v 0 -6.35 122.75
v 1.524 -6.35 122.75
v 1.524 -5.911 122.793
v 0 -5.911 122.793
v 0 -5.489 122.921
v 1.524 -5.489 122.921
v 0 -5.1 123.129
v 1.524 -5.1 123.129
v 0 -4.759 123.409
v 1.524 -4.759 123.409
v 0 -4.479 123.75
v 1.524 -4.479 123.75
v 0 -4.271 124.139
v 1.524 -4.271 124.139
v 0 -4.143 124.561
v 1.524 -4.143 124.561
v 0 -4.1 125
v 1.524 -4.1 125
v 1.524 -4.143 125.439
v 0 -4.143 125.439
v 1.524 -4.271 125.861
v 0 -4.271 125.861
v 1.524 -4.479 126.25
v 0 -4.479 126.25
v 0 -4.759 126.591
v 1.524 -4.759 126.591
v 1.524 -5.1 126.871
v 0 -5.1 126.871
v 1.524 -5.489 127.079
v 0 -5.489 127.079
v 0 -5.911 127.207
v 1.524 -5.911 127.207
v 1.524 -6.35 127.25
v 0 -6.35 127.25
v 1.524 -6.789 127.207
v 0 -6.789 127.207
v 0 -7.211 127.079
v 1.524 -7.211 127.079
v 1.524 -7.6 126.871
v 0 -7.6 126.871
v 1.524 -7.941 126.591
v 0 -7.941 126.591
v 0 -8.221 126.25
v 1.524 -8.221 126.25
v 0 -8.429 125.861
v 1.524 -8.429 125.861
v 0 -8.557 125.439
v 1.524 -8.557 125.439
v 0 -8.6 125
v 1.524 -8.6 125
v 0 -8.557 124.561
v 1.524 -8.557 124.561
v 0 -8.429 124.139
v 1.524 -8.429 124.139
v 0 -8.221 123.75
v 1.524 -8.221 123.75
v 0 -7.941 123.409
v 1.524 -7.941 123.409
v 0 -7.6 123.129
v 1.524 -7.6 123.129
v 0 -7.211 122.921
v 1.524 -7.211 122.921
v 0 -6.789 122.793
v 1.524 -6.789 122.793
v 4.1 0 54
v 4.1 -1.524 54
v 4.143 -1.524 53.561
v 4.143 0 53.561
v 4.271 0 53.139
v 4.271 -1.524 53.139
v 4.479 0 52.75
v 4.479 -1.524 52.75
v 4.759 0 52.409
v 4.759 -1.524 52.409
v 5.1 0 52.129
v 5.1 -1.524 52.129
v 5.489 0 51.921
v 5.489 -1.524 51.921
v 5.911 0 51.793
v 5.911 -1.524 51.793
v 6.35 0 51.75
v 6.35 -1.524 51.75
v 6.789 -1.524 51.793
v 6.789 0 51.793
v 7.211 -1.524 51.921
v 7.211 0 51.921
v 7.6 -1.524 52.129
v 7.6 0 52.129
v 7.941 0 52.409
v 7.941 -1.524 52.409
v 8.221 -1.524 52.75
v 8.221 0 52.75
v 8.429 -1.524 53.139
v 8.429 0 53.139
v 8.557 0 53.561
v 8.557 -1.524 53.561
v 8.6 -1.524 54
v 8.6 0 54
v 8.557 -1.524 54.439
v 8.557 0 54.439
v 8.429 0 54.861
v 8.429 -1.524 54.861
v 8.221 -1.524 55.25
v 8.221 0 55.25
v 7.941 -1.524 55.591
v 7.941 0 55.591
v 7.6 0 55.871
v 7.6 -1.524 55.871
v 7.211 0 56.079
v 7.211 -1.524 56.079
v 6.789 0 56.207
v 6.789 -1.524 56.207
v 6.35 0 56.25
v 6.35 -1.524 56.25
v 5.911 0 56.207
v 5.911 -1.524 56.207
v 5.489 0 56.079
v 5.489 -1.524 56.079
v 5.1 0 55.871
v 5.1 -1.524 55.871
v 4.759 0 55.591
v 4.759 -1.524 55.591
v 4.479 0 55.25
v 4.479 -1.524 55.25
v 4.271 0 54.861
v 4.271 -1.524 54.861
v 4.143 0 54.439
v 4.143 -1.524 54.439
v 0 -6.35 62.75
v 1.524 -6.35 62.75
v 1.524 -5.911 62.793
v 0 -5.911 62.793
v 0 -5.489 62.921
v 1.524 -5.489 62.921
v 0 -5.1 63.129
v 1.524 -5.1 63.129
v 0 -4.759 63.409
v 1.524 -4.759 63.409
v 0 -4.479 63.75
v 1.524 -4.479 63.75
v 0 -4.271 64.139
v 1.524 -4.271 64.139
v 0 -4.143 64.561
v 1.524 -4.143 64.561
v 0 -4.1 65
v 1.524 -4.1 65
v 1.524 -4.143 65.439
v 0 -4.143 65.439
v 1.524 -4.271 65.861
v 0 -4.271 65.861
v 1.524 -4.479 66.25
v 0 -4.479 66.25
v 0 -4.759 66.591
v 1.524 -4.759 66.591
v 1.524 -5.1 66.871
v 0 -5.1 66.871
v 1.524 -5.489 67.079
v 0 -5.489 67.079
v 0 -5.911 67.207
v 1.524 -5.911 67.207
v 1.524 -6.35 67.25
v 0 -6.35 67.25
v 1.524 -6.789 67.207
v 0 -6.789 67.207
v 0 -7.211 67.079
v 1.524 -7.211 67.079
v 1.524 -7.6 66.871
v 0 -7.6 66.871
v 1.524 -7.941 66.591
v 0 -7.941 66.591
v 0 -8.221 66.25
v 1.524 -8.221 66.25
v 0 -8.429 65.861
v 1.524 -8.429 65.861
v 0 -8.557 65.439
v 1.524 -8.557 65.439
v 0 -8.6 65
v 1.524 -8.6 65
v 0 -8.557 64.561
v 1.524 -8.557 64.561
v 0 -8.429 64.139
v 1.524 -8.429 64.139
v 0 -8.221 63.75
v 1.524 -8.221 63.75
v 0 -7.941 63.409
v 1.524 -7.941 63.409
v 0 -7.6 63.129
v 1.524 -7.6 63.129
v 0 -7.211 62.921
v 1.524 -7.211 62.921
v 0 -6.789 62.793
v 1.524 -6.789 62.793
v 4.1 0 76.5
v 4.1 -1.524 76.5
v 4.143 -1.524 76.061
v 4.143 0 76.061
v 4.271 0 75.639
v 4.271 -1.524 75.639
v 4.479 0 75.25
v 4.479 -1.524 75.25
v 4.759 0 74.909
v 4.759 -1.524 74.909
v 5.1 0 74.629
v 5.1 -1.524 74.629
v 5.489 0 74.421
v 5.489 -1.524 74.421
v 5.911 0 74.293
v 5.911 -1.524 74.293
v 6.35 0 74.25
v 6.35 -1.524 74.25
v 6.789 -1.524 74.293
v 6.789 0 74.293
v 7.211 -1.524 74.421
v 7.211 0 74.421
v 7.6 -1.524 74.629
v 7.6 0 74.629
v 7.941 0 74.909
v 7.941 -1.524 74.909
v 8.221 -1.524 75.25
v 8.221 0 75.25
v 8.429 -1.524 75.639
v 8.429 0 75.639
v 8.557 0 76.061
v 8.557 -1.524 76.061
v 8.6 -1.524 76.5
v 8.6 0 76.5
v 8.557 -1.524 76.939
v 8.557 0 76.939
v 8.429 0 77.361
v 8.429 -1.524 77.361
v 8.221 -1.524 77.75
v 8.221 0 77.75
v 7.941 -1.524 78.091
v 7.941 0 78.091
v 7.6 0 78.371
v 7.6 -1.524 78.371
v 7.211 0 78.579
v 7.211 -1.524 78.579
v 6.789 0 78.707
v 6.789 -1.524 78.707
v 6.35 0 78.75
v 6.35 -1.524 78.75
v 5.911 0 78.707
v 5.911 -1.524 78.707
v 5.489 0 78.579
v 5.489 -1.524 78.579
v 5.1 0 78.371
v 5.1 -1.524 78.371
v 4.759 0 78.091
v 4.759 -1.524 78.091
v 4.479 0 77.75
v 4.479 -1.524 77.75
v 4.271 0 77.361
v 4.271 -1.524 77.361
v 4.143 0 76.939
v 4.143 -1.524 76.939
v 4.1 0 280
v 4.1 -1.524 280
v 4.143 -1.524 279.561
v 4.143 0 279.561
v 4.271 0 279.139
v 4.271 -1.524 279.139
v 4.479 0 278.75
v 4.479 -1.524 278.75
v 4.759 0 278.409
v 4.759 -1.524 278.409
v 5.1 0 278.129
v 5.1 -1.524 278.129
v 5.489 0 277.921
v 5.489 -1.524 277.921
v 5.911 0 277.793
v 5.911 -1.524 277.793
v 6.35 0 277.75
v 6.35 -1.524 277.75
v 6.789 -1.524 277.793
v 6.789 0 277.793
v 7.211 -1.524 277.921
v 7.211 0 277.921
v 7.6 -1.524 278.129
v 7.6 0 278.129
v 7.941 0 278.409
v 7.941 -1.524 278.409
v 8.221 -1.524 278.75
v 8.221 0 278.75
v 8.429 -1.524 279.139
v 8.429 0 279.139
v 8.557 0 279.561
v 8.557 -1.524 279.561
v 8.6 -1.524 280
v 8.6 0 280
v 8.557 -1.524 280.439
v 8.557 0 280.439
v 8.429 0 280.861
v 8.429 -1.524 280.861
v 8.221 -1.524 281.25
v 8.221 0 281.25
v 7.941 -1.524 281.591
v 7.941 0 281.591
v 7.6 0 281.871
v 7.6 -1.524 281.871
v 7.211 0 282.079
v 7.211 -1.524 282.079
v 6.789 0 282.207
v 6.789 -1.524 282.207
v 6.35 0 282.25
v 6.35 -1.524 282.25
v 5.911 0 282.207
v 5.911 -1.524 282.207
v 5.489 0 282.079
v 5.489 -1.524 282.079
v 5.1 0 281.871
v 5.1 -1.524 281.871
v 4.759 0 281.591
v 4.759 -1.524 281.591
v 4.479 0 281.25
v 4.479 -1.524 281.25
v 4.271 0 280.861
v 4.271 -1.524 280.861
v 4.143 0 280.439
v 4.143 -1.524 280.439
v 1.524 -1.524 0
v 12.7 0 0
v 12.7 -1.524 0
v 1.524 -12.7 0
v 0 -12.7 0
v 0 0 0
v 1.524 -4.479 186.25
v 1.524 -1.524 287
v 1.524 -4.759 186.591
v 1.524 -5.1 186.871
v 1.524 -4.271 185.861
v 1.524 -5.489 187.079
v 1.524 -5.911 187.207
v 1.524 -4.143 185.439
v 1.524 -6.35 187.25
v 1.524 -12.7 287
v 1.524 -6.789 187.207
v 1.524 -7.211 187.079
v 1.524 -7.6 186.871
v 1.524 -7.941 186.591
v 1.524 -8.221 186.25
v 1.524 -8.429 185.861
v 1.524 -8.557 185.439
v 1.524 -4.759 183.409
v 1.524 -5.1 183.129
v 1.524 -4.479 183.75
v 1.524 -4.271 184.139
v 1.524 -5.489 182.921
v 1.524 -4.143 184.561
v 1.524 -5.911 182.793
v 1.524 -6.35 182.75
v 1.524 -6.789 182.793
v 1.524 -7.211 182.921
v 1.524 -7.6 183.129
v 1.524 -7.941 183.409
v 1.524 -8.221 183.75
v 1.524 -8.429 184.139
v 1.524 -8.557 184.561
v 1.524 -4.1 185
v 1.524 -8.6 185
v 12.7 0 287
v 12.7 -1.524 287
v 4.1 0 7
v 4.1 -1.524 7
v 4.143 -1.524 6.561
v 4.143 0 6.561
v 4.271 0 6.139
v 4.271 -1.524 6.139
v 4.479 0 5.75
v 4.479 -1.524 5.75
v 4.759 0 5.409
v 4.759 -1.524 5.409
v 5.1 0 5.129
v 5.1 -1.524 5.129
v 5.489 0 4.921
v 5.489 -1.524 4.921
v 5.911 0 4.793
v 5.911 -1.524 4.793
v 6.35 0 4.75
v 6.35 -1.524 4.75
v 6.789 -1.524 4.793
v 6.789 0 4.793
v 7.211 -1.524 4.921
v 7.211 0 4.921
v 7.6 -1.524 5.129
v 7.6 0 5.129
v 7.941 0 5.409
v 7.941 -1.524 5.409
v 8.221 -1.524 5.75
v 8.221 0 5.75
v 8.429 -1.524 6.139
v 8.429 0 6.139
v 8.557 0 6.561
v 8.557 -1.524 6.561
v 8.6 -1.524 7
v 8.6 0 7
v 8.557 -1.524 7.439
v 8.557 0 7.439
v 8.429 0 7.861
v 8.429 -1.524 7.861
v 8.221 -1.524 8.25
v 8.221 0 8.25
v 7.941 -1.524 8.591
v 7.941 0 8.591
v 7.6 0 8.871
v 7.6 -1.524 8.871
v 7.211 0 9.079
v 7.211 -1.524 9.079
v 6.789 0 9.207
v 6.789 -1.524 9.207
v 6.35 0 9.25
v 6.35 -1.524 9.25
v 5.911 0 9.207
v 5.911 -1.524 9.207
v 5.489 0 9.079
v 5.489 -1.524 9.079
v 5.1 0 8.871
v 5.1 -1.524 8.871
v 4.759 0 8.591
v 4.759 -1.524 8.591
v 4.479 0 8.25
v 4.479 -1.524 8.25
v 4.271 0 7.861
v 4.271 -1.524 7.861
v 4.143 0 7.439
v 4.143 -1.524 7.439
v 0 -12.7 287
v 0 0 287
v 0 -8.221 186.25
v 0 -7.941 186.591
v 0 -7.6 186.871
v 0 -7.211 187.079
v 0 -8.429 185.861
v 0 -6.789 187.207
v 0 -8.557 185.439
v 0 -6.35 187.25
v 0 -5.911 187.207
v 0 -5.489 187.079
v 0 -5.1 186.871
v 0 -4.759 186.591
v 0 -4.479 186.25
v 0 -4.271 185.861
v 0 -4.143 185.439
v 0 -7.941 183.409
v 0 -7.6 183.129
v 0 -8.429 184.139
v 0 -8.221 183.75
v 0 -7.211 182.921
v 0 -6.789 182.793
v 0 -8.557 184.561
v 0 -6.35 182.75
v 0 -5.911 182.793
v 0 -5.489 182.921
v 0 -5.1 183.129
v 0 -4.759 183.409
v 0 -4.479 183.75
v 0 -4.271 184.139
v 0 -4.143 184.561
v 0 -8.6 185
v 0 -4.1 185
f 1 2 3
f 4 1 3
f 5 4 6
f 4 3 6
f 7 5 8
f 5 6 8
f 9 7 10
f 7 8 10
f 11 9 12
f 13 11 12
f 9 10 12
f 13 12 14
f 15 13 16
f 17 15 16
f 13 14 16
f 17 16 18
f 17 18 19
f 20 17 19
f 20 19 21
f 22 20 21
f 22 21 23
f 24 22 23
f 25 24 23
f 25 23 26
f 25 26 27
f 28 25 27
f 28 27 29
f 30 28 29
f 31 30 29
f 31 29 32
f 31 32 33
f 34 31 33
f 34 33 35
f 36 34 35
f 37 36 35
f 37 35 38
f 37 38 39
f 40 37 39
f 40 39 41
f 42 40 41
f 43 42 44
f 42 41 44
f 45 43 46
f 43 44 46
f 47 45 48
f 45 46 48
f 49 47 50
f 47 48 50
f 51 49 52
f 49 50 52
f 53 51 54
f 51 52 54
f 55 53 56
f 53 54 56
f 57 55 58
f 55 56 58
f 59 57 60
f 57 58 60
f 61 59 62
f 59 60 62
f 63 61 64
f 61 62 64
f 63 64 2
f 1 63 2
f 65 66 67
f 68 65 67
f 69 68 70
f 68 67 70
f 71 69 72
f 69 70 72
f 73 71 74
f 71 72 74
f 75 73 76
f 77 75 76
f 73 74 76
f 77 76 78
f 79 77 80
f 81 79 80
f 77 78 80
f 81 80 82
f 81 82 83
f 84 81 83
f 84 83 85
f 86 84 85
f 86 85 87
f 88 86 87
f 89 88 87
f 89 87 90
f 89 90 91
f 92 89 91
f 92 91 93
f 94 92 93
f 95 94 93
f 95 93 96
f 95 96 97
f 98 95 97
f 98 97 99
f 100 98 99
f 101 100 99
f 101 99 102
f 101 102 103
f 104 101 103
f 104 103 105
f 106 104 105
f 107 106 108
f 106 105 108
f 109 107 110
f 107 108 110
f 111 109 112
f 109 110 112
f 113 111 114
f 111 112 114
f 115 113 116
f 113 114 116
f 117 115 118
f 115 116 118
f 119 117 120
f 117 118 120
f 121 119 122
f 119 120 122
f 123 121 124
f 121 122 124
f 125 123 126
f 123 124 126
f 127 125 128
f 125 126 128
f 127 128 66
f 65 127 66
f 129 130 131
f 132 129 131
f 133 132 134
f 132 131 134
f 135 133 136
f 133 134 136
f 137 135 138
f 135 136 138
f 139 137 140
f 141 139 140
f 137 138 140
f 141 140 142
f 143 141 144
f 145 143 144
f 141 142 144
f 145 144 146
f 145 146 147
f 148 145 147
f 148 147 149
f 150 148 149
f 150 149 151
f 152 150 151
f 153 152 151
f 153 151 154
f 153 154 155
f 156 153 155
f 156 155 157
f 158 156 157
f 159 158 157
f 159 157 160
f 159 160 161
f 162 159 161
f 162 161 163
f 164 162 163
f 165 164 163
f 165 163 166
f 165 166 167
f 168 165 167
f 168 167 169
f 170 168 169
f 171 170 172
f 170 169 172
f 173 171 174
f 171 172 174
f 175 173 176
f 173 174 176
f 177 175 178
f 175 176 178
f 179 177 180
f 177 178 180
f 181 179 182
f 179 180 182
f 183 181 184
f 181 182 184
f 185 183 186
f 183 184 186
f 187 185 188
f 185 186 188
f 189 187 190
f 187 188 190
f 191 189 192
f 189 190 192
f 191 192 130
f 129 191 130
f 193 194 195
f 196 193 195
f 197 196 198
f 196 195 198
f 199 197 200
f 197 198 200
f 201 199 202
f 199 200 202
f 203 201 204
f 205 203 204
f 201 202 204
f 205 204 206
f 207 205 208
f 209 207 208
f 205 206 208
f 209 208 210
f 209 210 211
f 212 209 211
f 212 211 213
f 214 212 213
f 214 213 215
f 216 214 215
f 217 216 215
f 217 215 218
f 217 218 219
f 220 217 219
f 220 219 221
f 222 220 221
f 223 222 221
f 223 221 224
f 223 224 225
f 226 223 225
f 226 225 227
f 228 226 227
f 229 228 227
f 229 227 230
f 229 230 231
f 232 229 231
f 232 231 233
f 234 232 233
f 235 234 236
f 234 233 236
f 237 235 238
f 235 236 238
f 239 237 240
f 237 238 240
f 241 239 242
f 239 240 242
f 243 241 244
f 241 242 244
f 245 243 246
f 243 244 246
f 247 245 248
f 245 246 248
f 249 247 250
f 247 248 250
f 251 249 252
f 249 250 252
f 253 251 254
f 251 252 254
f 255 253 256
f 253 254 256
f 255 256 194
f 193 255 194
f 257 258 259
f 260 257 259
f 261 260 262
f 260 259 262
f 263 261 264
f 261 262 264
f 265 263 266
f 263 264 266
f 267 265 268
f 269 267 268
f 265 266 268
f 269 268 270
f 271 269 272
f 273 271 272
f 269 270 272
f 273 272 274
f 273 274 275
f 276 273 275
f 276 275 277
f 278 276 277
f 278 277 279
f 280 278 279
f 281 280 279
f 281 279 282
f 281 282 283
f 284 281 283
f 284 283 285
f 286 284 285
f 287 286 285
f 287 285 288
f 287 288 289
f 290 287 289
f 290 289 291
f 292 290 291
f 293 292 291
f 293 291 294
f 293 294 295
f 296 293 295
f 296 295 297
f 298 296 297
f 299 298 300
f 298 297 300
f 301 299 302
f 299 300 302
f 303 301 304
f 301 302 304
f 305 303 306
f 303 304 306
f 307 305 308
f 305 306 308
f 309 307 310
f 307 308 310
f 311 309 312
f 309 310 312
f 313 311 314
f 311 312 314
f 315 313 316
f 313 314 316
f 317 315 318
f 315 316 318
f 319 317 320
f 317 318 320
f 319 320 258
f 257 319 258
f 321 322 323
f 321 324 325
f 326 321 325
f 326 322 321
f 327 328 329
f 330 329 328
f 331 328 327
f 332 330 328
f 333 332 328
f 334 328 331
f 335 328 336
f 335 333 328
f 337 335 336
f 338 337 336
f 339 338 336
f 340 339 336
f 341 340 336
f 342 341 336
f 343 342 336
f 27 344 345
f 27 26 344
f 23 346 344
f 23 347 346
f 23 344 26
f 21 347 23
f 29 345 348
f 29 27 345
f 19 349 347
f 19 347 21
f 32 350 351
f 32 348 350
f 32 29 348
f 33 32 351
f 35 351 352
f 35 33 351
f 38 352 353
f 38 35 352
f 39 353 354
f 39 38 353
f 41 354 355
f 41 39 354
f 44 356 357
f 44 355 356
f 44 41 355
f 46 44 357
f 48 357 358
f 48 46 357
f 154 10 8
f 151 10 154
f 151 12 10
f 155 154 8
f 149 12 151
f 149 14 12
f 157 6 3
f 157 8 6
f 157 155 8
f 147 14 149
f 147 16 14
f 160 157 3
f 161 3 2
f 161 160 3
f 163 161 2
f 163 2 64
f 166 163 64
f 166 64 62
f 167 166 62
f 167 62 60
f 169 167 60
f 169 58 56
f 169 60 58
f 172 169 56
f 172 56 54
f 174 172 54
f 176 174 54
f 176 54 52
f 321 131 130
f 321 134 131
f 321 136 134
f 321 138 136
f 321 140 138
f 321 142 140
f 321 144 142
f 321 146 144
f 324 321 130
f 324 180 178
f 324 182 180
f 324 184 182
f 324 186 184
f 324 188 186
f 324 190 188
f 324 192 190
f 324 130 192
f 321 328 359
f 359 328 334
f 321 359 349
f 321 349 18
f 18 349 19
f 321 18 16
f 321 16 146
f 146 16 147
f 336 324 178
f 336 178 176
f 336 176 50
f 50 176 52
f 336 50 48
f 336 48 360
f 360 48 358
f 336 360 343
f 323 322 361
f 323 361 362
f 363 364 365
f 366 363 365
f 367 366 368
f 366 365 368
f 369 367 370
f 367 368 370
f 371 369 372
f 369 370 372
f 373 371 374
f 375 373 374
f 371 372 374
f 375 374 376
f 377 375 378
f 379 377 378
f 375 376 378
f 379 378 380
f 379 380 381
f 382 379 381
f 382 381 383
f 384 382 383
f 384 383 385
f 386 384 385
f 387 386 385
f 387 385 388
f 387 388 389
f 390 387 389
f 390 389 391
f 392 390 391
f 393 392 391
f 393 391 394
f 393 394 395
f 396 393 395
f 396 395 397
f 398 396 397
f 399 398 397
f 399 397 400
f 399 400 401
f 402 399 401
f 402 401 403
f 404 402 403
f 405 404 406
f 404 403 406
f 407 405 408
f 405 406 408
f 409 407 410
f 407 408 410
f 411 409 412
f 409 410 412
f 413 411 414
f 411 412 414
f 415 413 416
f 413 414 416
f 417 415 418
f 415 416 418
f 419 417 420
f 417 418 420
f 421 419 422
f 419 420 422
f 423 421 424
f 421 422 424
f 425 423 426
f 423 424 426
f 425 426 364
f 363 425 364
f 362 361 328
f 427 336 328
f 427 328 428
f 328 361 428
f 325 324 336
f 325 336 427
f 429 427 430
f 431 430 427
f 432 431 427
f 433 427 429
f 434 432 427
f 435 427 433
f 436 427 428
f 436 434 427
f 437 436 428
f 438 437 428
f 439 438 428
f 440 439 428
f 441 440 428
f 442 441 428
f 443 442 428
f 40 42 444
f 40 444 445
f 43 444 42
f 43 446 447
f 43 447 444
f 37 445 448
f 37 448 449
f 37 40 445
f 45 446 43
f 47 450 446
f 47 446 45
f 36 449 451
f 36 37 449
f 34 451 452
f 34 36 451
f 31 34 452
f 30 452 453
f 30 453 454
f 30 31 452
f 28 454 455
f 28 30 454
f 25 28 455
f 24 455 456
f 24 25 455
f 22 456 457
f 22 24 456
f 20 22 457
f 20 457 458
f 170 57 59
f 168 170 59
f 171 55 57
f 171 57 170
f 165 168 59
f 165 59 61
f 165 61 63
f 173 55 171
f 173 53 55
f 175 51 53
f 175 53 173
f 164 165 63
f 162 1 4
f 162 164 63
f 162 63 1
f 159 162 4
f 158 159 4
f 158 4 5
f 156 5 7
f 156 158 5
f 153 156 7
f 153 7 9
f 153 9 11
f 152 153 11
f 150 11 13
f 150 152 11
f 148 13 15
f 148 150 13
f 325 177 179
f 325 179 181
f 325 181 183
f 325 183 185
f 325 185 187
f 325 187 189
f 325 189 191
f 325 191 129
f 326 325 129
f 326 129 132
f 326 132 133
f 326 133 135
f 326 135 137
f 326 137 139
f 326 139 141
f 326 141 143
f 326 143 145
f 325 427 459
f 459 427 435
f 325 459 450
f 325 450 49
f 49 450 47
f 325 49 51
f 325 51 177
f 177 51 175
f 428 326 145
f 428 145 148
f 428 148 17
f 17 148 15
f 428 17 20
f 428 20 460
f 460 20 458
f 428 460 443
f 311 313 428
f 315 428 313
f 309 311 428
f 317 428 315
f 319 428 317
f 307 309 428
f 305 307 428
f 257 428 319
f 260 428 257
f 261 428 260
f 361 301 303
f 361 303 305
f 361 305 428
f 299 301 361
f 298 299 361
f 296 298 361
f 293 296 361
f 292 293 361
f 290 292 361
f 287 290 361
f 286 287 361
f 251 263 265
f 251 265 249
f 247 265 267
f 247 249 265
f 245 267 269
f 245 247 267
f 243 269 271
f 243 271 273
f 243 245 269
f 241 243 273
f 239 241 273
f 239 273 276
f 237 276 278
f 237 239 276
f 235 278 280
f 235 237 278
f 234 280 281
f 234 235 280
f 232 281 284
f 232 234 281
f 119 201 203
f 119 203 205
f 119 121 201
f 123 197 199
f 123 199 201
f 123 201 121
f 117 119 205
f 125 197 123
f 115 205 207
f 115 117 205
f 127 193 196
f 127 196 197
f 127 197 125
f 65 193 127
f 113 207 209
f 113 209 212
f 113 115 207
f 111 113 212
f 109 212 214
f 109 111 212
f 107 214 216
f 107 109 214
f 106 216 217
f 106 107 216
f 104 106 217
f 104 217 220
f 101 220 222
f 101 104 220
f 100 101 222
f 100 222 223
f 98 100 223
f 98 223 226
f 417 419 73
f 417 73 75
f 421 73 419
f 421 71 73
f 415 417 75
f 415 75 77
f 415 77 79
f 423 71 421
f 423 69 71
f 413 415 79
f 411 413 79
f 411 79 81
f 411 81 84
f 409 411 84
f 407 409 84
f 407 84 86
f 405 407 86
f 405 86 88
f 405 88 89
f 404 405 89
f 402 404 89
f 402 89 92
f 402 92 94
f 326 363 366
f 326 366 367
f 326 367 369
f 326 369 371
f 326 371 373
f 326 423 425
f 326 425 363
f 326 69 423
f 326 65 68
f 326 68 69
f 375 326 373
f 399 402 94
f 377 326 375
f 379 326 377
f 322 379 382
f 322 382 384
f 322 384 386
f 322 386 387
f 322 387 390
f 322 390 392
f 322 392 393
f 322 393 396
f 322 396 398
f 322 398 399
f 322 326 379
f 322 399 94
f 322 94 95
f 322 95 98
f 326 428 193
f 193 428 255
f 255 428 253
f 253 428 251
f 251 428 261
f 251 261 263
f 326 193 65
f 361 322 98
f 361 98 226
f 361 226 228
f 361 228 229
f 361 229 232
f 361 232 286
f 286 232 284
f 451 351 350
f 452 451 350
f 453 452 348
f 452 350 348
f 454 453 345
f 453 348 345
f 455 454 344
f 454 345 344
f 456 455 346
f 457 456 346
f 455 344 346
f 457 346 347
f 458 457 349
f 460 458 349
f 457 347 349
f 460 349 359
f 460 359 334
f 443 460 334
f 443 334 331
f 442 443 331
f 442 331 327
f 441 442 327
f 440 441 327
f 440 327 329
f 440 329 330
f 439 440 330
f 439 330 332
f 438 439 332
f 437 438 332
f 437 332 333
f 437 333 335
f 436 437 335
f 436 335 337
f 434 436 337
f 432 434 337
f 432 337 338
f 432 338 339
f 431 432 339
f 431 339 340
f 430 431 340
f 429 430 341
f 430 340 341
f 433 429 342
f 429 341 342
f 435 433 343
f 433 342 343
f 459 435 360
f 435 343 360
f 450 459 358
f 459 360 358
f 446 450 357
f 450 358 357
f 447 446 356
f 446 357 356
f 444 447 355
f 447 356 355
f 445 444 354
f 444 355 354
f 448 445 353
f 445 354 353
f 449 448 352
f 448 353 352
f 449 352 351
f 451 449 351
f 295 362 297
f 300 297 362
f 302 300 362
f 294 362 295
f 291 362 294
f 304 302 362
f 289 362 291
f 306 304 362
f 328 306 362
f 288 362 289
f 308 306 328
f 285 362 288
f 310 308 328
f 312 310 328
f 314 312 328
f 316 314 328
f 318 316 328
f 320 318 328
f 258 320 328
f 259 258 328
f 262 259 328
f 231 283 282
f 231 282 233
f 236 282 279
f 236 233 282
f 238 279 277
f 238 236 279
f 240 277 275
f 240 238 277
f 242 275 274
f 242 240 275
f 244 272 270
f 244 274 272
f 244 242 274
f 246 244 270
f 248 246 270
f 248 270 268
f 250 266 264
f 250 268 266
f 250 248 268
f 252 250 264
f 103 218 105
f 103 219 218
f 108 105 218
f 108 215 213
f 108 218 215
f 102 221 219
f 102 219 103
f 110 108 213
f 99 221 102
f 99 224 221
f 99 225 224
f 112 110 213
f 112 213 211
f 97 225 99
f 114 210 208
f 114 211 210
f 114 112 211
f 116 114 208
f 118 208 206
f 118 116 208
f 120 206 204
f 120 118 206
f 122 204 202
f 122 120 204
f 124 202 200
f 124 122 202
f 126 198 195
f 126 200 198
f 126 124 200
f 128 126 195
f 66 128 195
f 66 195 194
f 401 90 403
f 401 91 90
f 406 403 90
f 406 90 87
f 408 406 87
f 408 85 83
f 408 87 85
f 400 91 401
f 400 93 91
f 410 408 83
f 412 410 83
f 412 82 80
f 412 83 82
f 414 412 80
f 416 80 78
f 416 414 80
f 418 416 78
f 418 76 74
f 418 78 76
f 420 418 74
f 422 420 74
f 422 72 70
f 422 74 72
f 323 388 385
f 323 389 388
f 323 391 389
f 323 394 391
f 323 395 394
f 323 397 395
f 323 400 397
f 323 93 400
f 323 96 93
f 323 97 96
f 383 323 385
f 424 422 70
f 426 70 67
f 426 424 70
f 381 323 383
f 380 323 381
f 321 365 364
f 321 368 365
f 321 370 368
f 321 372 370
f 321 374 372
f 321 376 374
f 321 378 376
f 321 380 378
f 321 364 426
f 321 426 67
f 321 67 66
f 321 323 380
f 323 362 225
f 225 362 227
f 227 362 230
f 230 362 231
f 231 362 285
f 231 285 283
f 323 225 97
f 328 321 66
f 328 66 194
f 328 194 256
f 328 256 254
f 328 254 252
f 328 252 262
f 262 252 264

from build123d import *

# Parameters (mm, degrees)
BOSS_EXTRUDE1_DEPTH  = 287
M4_CLEARANCE_HOLE1_D = 4.5
M4_CLEARANCE_HOLE2_D = 4.5


with BuildPart() as part:
    # Sketch1 → Boss-Extrude1 (new body)
    with BuildSketch(Plane.XY):
        Polygon((0, 0), (12.7, 0), (12.7, -1.524), (1.524, -1.524), (1.524, -12.7), (0, -12.7), align=None)
    extrude(amount=BOSS_EXTRUDE1_DEPTH)

    # M4 Clearance Hole1 (through all)
    with Locations(Plane(origin=(0, 0, 0), x_dir=(1, 0, 0), z_dir=(0, 1, 0))):
        with Locations((6.35, -7), (6.35, -280), (6.35, -54), (6.35, -76.5)):
            Hole(M4_CLEARANCE_HOLE1_D / 2)

    # M4 Clearance Hole2 (through all)
    with Locations(Plane.ZY):
        with Locations((125, -6.35), (65, -6.35), (185, -6.35)):
            Hole(M4_CLEARANCE_HOLE2_D / 2)


solid = part.part
